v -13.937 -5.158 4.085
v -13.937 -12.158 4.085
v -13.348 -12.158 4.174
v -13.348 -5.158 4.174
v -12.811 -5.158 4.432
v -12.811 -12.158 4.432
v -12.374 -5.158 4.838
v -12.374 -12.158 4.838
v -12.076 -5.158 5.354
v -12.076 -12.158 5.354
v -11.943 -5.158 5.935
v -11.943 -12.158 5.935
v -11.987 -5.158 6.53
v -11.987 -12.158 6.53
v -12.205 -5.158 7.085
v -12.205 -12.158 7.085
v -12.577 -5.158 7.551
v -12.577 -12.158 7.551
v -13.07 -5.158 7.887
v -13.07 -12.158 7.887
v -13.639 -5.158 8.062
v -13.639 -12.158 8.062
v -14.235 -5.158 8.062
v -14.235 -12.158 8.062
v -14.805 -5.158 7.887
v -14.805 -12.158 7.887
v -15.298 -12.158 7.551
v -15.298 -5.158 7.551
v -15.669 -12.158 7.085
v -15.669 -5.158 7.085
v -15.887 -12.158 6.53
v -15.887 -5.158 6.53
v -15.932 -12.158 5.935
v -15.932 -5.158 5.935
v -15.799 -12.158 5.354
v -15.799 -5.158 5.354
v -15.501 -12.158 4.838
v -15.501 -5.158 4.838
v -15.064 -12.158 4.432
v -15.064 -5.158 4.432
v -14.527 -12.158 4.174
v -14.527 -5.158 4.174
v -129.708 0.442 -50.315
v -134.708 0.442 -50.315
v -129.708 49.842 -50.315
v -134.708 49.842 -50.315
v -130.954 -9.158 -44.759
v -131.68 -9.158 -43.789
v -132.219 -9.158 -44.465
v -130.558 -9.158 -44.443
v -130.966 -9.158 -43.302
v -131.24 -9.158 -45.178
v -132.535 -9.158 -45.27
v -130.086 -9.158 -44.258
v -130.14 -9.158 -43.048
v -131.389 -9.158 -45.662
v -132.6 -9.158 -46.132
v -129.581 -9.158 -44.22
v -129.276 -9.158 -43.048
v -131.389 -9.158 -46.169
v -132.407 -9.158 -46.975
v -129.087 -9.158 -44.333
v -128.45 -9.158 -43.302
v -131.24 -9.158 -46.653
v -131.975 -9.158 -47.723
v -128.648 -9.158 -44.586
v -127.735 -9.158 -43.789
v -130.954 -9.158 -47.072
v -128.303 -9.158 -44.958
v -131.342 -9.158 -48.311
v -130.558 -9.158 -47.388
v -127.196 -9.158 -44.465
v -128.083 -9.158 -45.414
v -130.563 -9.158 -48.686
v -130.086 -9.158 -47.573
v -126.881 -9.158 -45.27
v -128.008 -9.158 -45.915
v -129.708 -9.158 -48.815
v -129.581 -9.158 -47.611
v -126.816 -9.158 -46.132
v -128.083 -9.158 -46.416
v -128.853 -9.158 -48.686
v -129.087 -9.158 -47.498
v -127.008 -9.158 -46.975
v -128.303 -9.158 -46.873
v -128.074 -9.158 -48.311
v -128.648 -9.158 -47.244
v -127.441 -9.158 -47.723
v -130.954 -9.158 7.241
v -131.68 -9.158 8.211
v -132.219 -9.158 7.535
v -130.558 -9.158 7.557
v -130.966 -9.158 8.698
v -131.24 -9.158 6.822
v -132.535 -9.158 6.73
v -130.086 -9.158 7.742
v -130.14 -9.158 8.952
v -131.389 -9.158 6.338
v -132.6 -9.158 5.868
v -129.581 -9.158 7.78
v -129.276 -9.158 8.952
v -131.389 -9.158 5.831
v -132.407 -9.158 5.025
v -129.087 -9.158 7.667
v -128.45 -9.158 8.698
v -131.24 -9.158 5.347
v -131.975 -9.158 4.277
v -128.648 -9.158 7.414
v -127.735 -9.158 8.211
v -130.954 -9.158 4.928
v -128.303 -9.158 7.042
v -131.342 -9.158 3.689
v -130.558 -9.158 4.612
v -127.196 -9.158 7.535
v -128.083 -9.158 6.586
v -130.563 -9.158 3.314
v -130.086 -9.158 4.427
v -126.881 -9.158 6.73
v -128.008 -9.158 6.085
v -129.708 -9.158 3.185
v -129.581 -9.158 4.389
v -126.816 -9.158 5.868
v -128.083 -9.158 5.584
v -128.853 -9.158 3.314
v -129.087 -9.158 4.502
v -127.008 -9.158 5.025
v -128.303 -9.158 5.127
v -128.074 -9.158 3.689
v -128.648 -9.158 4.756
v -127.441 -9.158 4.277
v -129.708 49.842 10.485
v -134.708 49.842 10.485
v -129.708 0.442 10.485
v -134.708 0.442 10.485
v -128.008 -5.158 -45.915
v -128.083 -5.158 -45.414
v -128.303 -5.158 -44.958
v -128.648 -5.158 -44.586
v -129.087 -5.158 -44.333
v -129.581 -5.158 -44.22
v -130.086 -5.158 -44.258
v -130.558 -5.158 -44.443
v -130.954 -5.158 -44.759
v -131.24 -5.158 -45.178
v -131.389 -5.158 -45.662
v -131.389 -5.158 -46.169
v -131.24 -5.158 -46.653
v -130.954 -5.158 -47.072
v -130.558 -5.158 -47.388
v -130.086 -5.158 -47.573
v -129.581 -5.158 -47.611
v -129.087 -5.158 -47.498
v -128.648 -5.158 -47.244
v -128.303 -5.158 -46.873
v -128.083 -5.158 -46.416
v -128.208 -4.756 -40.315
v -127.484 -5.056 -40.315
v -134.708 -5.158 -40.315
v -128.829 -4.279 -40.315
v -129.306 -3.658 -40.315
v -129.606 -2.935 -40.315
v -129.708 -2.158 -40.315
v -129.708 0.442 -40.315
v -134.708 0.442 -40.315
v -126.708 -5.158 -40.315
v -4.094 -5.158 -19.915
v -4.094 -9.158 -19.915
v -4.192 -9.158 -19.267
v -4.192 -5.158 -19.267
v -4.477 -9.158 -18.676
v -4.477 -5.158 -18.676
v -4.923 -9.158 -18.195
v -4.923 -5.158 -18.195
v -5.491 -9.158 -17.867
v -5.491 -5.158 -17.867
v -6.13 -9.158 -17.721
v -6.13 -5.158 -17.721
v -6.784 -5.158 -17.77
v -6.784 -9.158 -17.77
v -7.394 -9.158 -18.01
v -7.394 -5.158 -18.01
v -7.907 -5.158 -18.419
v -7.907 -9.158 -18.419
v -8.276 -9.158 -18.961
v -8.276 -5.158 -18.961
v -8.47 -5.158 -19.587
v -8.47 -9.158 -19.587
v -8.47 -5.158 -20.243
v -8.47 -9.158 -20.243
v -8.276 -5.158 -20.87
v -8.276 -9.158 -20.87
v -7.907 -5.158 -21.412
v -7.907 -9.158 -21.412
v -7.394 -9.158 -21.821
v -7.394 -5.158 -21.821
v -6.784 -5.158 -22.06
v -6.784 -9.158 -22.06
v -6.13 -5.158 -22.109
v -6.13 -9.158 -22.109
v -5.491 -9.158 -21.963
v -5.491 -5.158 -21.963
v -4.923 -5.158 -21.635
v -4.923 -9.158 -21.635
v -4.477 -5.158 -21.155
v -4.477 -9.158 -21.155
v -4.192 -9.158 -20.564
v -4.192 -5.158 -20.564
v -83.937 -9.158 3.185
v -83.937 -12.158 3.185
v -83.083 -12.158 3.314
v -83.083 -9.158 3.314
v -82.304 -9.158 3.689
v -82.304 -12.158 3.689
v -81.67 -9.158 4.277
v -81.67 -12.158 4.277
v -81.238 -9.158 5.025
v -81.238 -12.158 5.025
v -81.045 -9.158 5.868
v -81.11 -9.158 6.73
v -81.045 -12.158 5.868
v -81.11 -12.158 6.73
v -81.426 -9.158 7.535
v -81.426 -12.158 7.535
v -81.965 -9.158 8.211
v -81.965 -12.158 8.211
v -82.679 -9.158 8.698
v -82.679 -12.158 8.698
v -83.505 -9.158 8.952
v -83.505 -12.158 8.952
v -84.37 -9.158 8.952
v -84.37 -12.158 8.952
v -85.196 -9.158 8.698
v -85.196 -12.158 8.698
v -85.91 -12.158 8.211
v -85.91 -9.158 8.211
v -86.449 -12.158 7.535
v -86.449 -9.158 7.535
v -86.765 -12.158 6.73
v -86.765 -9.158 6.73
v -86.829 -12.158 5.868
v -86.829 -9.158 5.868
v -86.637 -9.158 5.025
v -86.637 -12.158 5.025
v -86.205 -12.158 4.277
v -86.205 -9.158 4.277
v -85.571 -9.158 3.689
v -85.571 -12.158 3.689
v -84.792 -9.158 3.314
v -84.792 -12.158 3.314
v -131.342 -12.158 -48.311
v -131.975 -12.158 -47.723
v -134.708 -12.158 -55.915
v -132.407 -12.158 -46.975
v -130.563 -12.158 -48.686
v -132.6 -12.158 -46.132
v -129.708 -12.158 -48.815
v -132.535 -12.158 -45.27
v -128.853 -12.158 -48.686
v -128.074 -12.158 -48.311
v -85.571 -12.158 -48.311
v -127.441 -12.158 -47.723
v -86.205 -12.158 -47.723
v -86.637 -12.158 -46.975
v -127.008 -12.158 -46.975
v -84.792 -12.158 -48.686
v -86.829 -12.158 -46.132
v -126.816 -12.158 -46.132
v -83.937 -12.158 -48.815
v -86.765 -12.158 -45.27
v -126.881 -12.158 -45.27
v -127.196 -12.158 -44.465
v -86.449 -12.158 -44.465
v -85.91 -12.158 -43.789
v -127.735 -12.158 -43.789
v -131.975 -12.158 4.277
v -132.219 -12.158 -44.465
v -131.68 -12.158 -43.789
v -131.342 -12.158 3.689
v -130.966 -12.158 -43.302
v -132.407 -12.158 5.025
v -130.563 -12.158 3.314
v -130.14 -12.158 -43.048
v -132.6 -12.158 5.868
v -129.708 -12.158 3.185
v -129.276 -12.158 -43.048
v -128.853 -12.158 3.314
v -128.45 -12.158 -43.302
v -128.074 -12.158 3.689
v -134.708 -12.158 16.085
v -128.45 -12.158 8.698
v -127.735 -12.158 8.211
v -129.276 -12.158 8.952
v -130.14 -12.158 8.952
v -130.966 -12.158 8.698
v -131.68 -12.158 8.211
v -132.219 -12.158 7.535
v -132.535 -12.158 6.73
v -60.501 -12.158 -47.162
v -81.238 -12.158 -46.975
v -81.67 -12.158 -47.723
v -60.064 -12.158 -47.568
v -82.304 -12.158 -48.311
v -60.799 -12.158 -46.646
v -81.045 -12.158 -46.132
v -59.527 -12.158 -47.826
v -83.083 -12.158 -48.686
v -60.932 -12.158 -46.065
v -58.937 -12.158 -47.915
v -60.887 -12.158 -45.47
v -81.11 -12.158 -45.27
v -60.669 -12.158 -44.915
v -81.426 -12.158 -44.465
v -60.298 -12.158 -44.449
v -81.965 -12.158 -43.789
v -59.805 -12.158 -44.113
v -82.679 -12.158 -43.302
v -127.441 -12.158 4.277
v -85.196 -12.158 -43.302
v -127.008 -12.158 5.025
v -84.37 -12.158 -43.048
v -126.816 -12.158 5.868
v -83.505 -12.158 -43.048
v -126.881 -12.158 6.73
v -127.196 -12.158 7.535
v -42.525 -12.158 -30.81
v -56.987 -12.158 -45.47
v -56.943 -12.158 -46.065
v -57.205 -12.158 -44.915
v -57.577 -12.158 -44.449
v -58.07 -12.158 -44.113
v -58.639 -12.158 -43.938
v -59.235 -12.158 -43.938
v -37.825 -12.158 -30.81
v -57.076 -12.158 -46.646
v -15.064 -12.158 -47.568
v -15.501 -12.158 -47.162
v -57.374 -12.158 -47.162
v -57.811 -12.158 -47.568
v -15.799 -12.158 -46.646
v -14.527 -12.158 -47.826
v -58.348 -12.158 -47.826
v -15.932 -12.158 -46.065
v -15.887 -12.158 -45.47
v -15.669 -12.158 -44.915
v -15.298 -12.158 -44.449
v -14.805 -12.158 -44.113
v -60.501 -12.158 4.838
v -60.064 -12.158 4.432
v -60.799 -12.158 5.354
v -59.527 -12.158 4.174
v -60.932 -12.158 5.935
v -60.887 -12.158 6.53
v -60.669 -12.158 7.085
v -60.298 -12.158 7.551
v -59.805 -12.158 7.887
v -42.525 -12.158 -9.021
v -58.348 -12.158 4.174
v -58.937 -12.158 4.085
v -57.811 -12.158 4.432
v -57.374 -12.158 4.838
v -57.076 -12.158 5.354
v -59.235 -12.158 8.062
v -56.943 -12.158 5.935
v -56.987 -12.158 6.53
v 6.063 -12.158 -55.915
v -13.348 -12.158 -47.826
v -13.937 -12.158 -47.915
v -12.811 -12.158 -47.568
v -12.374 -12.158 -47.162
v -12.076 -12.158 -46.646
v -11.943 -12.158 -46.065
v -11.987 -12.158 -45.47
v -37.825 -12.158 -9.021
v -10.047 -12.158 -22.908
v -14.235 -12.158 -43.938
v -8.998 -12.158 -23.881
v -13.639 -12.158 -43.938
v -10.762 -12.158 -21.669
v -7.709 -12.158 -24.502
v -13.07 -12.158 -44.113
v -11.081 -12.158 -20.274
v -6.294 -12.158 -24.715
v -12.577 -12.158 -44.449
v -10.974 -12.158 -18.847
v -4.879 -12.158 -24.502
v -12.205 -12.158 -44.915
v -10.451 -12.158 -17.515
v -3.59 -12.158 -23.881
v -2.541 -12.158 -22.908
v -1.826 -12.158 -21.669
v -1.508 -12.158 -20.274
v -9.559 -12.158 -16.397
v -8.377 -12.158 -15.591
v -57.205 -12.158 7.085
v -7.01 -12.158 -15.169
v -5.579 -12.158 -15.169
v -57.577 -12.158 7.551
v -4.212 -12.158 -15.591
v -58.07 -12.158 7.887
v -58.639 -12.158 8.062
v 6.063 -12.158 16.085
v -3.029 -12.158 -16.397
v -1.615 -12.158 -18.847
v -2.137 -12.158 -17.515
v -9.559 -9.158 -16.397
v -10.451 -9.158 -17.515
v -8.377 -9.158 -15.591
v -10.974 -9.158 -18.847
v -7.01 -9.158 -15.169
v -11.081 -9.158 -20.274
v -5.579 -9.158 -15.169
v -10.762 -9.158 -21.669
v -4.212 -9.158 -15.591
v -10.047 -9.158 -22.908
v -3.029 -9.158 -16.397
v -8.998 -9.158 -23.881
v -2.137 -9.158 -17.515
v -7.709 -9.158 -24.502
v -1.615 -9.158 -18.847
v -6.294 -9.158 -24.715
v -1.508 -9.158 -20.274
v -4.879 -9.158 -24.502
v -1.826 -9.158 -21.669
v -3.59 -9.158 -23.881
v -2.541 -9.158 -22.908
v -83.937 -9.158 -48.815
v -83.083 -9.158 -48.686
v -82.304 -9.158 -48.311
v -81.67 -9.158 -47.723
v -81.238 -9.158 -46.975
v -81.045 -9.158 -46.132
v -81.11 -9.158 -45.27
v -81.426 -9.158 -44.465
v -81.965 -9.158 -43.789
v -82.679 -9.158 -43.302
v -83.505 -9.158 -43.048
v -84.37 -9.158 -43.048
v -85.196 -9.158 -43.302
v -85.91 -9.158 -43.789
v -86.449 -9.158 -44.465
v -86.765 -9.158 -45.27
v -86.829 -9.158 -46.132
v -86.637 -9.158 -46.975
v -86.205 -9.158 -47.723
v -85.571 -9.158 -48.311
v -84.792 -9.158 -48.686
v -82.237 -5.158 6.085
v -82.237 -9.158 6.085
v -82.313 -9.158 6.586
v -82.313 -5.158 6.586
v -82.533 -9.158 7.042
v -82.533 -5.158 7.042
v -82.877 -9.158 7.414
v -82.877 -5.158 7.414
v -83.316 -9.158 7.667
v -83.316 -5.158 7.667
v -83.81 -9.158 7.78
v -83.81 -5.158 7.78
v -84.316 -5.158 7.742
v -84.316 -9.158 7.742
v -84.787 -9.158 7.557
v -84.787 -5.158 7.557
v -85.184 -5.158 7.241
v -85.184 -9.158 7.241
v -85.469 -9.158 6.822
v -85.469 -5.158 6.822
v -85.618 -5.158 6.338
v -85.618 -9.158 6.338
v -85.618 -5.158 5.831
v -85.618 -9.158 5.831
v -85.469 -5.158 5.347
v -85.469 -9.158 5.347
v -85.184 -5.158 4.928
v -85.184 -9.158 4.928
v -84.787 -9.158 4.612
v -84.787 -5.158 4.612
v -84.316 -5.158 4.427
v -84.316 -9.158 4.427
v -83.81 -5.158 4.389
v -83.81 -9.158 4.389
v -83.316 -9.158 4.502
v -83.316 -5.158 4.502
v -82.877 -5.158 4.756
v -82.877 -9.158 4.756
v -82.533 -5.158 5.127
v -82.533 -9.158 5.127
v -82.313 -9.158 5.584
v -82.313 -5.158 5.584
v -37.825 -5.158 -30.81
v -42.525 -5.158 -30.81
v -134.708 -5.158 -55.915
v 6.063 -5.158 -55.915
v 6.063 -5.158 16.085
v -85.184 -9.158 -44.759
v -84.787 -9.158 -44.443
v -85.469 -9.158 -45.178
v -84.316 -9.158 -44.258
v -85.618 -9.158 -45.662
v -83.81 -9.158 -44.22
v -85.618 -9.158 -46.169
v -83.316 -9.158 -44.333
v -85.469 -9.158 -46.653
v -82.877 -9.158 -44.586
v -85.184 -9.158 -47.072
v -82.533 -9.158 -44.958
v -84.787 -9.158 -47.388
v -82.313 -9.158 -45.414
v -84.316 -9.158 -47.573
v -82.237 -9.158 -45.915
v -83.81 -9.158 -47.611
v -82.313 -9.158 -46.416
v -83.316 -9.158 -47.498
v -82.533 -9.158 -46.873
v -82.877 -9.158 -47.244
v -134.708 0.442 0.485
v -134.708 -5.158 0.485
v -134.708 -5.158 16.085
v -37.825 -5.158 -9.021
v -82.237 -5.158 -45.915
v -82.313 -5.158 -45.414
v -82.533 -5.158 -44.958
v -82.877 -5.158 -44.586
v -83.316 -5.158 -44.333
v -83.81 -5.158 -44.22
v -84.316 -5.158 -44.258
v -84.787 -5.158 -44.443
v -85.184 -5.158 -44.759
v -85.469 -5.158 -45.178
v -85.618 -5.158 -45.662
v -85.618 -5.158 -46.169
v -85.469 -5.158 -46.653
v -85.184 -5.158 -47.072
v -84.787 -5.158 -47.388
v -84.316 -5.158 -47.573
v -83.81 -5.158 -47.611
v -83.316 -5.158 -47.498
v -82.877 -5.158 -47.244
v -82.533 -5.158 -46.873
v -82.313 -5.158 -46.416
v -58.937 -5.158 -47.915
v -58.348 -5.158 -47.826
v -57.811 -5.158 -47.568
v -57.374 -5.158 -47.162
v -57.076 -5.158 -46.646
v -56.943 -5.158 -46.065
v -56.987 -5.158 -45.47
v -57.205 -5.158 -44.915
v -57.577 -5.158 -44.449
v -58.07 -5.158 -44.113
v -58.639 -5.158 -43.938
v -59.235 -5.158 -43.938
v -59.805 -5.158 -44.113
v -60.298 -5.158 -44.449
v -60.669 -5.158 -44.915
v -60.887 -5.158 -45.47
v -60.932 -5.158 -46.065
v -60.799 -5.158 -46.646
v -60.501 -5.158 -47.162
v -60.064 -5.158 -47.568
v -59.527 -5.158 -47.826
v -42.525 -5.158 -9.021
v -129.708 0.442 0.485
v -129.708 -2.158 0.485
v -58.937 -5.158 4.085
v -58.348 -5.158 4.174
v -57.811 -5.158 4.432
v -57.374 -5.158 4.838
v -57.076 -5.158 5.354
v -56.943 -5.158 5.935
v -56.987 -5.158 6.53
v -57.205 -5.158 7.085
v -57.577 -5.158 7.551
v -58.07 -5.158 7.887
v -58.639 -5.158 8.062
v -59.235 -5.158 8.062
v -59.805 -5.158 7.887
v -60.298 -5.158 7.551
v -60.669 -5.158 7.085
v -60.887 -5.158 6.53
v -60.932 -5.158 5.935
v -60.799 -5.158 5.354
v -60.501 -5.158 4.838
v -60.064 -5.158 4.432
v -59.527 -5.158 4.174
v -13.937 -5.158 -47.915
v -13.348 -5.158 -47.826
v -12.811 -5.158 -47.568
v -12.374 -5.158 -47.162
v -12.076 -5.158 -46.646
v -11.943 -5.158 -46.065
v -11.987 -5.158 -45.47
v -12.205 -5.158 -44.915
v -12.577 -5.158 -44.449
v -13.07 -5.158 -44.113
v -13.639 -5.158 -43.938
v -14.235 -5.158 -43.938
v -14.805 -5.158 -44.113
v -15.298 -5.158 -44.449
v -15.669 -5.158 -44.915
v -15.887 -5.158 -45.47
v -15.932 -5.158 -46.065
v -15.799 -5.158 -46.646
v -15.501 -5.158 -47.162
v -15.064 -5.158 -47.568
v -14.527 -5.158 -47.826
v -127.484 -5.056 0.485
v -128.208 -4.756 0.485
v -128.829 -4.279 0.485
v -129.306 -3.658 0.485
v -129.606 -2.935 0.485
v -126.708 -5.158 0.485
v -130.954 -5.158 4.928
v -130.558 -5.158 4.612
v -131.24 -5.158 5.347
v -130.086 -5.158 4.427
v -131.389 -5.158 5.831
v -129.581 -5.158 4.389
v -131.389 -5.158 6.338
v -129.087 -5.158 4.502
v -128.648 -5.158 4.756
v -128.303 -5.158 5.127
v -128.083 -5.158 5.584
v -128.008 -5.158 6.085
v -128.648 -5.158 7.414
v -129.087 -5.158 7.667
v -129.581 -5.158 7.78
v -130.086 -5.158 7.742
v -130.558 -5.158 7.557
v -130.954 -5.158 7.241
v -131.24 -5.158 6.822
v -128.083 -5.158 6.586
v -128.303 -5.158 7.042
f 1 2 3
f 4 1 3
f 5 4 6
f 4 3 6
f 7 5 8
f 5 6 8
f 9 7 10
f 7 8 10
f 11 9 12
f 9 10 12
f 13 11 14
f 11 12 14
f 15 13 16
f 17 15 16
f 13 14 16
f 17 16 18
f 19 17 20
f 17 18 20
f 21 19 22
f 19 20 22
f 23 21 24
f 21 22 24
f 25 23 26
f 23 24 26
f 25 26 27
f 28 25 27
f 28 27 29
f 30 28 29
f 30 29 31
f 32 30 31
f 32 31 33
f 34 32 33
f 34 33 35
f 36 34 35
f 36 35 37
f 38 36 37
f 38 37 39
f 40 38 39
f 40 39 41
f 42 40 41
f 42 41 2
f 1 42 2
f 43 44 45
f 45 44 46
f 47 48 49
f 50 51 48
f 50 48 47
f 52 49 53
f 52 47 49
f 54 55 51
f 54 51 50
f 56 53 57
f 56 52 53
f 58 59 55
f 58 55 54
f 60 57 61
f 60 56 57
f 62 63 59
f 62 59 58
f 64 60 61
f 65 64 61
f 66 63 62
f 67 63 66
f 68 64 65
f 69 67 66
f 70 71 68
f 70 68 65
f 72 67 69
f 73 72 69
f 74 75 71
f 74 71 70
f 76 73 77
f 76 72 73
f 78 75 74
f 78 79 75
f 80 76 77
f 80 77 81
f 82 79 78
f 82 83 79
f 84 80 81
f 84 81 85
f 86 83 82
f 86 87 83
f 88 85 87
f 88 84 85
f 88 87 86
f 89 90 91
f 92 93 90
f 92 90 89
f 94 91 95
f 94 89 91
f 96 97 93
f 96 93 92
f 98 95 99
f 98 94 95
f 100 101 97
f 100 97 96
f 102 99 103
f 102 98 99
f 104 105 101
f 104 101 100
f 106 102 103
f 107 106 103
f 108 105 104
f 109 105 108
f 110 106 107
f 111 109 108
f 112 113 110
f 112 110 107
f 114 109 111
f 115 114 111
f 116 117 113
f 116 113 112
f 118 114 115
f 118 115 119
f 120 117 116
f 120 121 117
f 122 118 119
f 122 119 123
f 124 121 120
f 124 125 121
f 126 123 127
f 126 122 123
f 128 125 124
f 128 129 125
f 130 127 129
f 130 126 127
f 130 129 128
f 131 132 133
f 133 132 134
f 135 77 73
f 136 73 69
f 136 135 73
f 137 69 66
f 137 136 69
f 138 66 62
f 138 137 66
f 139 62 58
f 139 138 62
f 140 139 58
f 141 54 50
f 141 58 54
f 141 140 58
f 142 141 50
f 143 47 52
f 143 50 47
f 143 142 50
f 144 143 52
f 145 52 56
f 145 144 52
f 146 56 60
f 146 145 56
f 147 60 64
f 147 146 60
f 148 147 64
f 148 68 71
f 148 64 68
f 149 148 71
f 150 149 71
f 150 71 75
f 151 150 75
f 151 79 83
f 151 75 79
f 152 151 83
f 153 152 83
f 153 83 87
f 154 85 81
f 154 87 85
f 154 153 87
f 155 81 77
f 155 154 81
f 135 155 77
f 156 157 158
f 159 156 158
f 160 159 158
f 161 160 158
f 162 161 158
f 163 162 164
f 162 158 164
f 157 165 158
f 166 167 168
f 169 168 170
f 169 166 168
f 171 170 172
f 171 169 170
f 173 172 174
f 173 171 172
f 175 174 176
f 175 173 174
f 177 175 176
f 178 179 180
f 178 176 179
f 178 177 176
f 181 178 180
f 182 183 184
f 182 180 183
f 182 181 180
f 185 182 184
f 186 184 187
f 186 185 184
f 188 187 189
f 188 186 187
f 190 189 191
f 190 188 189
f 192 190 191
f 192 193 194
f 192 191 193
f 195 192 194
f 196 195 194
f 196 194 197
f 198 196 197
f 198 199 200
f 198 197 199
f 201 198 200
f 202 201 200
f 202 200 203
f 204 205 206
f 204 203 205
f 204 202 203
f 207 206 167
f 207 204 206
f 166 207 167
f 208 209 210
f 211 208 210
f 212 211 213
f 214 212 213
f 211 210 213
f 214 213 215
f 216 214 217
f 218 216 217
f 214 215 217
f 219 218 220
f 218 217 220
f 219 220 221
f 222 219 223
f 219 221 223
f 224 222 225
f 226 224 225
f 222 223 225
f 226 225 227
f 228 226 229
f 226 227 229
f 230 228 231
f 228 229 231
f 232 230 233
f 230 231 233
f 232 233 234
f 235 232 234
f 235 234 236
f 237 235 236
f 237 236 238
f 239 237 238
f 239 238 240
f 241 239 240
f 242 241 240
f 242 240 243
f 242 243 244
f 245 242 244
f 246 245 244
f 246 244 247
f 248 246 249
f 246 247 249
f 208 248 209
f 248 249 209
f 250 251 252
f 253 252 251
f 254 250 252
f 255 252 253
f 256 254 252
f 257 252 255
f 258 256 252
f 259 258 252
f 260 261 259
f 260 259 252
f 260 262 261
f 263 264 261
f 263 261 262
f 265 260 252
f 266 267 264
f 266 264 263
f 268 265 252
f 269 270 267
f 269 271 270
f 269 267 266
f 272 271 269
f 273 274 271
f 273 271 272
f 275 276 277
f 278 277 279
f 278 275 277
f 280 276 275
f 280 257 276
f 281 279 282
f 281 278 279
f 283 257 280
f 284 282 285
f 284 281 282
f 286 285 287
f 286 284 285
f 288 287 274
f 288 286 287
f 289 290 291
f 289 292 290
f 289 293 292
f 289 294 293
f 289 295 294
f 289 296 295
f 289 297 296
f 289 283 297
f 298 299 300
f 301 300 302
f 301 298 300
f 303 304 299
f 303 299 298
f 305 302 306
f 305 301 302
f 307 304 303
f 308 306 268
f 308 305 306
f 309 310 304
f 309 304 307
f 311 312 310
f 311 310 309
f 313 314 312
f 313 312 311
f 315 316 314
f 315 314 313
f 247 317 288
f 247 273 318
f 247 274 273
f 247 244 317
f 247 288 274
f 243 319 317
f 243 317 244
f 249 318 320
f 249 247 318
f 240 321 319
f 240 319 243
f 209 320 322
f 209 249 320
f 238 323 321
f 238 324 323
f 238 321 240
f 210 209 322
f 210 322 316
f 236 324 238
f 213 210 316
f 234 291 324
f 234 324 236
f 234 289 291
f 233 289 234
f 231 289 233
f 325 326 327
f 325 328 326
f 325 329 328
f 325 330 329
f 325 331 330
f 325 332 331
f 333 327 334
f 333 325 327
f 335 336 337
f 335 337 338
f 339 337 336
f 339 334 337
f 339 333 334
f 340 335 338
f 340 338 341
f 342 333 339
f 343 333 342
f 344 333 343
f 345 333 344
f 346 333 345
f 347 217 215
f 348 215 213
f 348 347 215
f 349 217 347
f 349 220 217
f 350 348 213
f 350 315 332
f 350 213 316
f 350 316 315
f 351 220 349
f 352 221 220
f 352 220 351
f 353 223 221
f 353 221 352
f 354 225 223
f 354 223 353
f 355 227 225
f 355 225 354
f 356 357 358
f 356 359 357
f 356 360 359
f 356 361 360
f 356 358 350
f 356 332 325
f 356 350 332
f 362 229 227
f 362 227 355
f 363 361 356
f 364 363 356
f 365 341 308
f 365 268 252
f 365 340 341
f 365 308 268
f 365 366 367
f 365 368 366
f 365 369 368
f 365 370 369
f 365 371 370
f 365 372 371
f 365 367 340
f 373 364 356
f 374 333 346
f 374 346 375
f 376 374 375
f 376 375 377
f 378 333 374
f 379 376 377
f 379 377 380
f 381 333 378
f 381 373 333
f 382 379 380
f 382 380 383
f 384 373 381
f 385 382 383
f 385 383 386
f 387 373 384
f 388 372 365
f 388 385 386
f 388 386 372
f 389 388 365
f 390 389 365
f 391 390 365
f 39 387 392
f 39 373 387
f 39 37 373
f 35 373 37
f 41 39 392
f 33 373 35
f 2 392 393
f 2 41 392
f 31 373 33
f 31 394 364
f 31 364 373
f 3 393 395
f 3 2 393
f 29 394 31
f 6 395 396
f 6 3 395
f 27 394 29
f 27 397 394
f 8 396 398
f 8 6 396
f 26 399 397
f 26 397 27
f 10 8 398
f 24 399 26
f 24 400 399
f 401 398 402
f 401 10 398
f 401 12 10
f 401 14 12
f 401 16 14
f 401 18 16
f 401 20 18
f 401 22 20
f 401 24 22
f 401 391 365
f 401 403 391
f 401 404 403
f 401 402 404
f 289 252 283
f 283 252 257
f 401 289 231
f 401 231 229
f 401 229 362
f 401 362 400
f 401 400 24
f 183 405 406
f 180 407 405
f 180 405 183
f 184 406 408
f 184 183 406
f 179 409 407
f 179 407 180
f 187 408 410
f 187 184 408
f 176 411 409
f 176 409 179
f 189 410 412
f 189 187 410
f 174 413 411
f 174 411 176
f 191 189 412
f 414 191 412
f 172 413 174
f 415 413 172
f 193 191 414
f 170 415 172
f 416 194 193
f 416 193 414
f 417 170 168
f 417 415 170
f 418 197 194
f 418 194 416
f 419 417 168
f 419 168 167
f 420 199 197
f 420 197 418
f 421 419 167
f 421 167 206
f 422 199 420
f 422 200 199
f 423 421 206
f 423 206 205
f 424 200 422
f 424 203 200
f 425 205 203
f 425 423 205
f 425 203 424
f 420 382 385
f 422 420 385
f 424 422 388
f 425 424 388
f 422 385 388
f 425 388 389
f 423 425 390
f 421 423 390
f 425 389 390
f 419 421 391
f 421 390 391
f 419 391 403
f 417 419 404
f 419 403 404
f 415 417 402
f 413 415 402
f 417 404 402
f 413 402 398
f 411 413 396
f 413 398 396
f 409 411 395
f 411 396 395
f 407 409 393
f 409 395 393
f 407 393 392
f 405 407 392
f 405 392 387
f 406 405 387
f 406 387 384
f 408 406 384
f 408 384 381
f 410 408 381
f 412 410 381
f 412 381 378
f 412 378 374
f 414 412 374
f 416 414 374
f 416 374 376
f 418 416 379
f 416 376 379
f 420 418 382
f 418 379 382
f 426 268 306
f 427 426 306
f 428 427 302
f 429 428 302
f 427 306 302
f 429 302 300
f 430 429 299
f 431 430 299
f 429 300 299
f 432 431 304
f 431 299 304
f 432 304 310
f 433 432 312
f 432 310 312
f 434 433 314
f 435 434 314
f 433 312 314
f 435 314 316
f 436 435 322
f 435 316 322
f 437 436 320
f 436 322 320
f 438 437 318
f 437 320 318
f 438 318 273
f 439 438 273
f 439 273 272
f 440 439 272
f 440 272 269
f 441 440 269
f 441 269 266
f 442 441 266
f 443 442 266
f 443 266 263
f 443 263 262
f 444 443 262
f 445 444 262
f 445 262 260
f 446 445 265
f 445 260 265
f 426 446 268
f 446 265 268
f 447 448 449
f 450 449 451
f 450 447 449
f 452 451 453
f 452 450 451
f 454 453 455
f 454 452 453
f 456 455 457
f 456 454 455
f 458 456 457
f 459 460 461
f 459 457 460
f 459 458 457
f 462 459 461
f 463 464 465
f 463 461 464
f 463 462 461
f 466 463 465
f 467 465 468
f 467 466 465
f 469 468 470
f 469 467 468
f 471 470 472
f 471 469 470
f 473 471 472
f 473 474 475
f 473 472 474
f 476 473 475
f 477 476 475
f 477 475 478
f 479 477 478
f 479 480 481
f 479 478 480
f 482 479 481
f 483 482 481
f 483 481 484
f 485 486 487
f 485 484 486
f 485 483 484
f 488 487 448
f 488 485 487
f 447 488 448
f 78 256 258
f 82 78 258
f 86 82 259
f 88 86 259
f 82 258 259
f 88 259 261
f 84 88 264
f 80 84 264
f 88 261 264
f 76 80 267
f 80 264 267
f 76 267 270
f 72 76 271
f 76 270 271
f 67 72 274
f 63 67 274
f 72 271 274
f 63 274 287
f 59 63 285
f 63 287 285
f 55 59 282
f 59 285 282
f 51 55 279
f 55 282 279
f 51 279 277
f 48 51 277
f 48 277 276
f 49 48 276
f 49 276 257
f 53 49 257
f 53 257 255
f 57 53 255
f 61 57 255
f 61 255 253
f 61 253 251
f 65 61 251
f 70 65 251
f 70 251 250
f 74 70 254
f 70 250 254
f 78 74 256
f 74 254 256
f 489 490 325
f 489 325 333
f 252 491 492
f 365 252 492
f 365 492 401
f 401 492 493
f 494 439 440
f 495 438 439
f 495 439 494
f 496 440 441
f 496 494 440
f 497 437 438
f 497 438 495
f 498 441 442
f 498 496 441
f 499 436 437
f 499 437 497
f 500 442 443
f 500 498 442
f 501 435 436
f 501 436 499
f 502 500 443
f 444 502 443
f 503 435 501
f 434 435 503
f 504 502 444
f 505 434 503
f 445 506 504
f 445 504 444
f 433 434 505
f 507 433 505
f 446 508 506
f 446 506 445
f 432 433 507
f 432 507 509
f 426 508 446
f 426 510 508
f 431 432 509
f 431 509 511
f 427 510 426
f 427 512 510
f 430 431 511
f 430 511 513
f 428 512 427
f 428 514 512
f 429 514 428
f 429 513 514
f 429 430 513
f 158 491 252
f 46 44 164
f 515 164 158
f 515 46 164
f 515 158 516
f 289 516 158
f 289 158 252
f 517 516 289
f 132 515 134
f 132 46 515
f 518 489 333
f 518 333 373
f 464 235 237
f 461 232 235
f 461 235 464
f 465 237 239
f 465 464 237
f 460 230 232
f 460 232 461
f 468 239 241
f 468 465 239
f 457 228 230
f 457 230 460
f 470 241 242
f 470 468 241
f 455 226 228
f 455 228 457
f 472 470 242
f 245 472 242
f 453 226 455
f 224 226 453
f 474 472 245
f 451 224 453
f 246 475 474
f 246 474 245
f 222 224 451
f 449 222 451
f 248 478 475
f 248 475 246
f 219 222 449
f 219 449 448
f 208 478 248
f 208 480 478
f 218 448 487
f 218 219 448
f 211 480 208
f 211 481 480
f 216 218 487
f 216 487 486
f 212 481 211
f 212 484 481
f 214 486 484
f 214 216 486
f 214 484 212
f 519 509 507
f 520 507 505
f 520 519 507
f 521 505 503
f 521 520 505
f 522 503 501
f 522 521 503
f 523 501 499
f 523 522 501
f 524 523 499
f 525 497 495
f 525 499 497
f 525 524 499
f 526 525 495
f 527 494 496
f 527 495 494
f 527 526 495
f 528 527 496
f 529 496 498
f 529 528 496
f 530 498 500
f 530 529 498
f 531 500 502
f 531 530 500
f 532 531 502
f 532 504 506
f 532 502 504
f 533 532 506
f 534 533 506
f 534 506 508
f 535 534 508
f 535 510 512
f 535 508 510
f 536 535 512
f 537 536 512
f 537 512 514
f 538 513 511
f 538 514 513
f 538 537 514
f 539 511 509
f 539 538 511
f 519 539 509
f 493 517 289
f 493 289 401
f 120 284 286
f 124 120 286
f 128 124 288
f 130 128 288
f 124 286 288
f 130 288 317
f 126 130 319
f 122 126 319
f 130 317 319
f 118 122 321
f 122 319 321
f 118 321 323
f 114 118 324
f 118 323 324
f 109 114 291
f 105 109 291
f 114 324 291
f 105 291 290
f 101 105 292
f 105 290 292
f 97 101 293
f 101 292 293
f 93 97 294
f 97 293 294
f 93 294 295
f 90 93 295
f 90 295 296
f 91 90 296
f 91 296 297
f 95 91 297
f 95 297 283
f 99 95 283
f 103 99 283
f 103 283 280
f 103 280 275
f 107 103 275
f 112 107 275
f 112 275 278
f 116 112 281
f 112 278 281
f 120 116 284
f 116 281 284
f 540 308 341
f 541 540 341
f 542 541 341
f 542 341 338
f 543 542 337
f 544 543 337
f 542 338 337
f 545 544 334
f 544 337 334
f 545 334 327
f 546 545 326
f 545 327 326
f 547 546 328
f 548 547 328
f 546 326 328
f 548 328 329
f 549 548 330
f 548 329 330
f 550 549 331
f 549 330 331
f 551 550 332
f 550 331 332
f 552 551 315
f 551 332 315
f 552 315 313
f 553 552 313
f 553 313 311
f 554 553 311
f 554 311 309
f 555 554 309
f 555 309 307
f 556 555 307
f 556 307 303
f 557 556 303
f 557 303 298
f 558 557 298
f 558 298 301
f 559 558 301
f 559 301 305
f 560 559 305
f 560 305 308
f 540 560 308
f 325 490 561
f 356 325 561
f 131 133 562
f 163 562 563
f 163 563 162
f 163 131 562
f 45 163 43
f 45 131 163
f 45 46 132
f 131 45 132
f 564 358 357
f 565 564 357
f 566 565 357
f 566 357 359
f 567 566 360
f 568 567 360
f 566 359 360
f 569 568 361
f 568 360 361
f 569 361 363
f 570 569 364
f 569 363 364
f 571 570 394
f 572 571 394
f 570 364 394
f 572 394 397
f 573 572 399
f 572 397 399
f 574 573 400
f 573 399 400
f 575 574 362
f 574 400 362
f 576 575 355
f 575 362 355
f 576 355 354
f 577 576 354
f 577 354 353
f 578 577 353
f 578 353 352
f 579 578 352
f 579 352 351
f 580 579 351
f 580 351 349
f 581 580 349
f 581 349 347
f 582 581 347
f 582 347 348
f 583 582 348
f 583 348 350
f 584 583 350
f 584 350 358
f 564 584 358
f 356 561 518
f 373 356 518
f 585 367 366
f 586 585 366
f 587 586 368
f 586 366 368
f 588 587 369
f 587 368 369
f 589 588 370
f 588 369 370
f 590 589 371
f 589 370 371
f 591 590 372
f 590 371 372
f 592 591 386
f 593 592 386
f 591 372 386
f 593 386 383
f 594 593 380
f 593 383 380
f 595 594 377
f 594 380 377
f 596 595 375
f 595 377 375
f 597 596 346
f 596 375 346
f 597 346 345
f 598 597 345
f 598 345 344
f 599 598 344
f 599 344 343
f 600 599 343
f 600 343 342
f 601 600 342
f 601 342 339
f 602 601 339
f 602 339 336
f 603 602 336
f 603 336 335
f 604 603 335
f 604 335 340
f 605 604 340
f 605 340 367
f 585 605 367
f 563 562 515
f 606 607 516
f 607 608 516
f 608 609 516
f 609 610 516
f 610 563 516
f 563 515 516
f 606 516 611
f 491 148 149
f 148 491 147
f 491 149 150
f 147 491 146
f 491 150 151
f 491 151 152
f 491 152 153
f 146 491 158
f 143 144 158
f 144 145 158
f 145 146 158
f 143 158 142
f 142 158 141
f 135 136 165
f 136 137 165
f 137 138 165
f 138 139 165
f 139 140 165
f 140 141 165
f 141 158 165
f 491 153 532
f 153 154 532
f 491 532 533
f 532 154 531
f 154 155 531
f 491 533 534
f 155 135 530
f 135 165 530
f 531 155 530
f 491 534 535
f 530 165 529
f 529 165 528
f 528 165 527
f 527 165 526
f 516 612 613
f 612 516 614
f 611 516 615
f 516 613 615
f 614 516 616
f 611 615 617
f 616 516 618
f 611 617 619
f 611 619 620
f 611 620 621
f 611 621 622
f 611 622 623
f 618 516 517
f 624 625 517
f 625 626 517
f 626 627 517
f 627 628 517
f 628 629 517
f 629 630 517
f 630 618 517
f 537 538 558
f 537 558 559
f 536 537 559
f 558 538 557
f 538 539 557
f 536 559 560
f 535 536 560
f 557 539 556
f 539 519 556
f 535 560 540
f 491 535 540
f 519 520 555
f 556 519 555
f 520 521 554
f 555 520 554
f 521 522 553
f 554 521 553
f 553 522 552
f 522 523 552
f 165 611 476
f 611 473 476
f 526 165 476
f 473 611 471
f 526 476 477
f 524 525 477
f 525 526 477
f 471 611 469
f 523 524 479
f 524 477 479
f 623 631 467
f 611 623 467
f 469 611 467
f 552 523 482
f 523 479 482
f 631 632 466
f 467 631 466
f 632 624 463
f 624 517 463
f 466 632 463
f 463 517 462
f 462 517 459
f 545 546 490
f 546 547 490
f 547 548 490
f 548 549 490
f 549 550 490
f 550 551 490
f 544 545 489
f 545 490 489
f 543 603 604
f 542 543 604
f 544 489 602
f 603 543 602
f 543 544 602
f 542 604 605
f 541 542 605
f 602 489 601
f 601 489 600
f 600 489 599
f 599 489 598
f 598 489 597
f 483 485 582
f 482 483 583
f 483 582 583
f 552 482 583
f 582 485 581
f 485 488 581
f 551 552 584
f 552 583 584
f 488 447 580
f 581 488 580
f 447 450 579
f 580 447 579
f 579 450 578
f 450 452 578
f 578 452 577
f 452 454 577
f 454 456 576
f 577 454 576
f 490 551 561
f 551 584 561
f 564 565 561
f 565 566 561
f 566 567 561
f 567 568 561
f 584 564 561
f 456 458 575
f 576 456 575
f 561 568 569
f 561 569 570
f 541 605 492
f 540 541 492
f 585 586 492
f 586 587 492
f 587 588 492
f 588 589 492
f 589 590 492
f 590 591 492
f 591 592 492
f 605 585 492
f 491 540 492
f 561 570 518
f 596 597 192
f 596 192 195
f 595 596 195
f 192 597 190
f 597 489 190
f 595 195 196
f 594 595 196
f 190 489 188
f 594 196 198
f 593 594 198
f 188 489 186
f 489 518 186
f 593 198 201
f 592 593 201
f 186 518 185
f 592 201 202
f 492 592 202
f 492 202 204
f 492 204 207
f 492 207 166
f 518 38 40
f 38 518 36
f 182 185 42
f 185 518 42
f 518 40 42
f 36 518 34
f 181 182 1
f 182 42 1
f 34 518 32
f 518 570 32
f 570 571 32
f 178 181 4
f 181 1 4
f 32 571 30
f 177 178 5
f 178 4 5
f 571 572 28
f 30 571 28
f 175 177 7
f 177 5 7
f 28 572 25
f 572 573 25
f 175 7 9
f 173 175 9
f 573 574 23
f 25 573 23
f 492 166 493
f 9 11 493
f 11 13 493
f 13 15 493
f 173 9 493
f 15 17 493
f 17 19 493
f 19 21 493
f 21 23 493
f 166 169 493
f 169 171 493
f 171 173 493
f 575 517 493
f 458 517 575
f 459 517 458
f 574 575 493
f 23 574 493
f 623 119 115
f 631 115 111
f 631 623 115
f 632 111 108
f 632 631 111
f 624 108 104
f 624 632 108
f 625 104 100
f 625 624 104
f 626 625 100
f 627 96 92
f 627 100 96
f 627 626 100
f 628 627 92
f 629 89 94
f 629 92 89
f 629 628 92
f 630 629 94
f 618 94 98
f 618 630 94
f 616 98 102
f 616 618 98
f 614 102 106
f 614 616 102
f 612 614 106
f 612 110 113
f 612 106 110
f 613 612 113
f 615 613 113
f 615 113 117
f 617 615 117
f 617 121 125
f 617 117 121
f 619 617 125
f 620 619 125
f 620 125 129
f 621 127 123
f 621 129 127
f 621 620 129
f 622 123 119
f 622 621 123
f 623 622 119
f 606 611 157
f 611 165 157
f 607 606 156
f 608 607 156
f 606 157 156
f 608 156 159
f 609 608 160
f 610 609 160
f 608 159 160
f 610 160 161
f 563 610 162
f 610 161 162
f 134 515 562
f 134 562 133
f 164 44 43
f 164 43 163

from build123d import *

# Parameters (mm, degrees)
EXTRUDE_2_OUTLINE_W   = 140.770566096
EXTRUDE_2_OUTLINE_H   = 72
EXTRUDE_2_OUTLINE_R   = 1.7
EXTRUDE_2_OUTLINE_W_2 = 4.7
EXTRUDE_2_OUTLINE_H_2 = 21.788461539
EXTRUDE_2_OUTLINE_R_2 = 2.2
EXTRUDE_2_DEPTH       = 7
SKETCH_2_R            = 2.9
SKETCH_2_R_2          = 4.8
CUT_EXTRUDE_1_DEPTH   = 3
EXTRUDE_3_DEPTH       = 5
FILLET_1_R            = 3
SKETCH_4_R            = 2
CUT_EXTRUDE_2_DEPTH   = 159.482615774


# Read off the part's stored shape, not the designer's step: 填料-伸長2
with BuildPart() as part:
    # 填料-伸長2 outline → 填料-伸長2 (new body)
    with BuildSketch(Plane.XZ.offset(5.158117597)):
        with Locations((-64.32262294, -19.915289206)):
            Rectangle(EXTRUDE_2_OUTLINE_W, EXTRUDE_2_OUTLINE_H)
        with Locations((-129.707905988, -45.915289206)):
            Circle(EXTRUDE_2_OUTLINE_R, mode=Mode.SUBTRACT)
        with Locations((-83.937339892, -45.915289206)):
            Circle(EXTRUDE_2_OUTLINE_R, mode=Mode.SUBTRACT)
        with Locations((-40.175495169, -19.915289206)):
            Rectangle(EXTRUDE_2_OUTLINE_W_2, EXTRUDE_2_OUTLINE_H_2, mode=Mode.SUBTRACT)
        with Locations((-129.707905988, 6.084710794)):
            Circle(EXTRUDE_2_OUTLINE_R, mode=Mode.SUBTRACT)
        with Locations((-83.937339892, 6.084710794)):
            Circle(EXTRUDE_2_OUTLINE_R, mode=Mode.SUBTRACT)
        with Locations((-6.29428449, -19.915289206)):
            Circle(EXTRUDE_2_OUTLINE_R_2, mode=Mode.SUBTRACT)
    extrude(amount=EXTRUDE_2_DEPTH)

    # 草圖2 → 除料-伸長1 (cut)
    with BuildSketch(Plane.XZ.offset(12.158117597)):
        with Locations(Location((-129.707905988, -45.915289206, 0), (0, 0, 270))):
            Circle(SKETCH_2_R)
        with Locations(Location((-129.707905988, 6.084710794, 0), (0, 0, 270))):
            Circle(SKETCH_2_R)
        with Locations(Location((-83.937339892, 6.084710794, 0), (0, 0, 270))):
            Circle(SKETCH_2_R)
        with Locations(Location((-83.937339892, -45.915289206, 0), (0, 0, 270))):
            Circle(SKETCH_2_R)
        with Locations(Location((-6.29428449, -19.915289206, 0), (0, 0, 270))):
            Circle(SKETCH_2_R_2)
    extrude(amount=-CUT_EXTRUDE_1_DEPTH, mode=Mode.SUBTRACT)

    # 草圖3 → 填料-伸長3 (add)
    with BuildSketch(Plane.ZY.offset(134.707905988)):
        Polygon((0.484710794, -5.158117597), (-40.315289206, -5.158117597), (-40.315289206, 0.441882403), (-40.915289206, 0.441882403), (-50.315289206, 0.441882403), (-50.315289206, 49.841882403), (10.484710794, 49.841882403), (10.484710794, 0.441882403), (1.084710794, 0.441882403), (0.484710794, 0.441882403), align=None)
    extrude(amount=-EXTRUDE_3_DEPTH)

    # 圓角1
    fillet_1_edges = [part.edges().sort_by_distance(p)[0] for p in [
        (-129.707905988, -5.158117597, -19.915289206),
    ]]
    fillet(fillet_1_edges, radius=FILLET_1_R)

    # 草圖4 → 除料-伸長2 (cut, through all)
    with BuildSketch(Plane.XZ.offset(12.158117597)):
        with Locations(Location((-58.937339892, 6.084710794, 0), (0, 0, 270))):
            Circle(SKETCH_4_R)
        with Locations(Location((-13.937339892, 6.084710794, 0), (0, 0, 270))):
            Circle(SKETCH_4_R)
        with Locations(Location((-13.937339892, -45.915289206, 0), (0, 0, 270))):
            Circle(SKETCH_4_R)
        with Locations(Location((-58.937339892, -45.915289206, 0), (0, 0, 270))):
            Circle(SKETCH_4_R)
    extrude(amount=-CUT_EXTRUDE_2_DEPTH, mode=Mode.SUBTRACT)


solid = part.part
